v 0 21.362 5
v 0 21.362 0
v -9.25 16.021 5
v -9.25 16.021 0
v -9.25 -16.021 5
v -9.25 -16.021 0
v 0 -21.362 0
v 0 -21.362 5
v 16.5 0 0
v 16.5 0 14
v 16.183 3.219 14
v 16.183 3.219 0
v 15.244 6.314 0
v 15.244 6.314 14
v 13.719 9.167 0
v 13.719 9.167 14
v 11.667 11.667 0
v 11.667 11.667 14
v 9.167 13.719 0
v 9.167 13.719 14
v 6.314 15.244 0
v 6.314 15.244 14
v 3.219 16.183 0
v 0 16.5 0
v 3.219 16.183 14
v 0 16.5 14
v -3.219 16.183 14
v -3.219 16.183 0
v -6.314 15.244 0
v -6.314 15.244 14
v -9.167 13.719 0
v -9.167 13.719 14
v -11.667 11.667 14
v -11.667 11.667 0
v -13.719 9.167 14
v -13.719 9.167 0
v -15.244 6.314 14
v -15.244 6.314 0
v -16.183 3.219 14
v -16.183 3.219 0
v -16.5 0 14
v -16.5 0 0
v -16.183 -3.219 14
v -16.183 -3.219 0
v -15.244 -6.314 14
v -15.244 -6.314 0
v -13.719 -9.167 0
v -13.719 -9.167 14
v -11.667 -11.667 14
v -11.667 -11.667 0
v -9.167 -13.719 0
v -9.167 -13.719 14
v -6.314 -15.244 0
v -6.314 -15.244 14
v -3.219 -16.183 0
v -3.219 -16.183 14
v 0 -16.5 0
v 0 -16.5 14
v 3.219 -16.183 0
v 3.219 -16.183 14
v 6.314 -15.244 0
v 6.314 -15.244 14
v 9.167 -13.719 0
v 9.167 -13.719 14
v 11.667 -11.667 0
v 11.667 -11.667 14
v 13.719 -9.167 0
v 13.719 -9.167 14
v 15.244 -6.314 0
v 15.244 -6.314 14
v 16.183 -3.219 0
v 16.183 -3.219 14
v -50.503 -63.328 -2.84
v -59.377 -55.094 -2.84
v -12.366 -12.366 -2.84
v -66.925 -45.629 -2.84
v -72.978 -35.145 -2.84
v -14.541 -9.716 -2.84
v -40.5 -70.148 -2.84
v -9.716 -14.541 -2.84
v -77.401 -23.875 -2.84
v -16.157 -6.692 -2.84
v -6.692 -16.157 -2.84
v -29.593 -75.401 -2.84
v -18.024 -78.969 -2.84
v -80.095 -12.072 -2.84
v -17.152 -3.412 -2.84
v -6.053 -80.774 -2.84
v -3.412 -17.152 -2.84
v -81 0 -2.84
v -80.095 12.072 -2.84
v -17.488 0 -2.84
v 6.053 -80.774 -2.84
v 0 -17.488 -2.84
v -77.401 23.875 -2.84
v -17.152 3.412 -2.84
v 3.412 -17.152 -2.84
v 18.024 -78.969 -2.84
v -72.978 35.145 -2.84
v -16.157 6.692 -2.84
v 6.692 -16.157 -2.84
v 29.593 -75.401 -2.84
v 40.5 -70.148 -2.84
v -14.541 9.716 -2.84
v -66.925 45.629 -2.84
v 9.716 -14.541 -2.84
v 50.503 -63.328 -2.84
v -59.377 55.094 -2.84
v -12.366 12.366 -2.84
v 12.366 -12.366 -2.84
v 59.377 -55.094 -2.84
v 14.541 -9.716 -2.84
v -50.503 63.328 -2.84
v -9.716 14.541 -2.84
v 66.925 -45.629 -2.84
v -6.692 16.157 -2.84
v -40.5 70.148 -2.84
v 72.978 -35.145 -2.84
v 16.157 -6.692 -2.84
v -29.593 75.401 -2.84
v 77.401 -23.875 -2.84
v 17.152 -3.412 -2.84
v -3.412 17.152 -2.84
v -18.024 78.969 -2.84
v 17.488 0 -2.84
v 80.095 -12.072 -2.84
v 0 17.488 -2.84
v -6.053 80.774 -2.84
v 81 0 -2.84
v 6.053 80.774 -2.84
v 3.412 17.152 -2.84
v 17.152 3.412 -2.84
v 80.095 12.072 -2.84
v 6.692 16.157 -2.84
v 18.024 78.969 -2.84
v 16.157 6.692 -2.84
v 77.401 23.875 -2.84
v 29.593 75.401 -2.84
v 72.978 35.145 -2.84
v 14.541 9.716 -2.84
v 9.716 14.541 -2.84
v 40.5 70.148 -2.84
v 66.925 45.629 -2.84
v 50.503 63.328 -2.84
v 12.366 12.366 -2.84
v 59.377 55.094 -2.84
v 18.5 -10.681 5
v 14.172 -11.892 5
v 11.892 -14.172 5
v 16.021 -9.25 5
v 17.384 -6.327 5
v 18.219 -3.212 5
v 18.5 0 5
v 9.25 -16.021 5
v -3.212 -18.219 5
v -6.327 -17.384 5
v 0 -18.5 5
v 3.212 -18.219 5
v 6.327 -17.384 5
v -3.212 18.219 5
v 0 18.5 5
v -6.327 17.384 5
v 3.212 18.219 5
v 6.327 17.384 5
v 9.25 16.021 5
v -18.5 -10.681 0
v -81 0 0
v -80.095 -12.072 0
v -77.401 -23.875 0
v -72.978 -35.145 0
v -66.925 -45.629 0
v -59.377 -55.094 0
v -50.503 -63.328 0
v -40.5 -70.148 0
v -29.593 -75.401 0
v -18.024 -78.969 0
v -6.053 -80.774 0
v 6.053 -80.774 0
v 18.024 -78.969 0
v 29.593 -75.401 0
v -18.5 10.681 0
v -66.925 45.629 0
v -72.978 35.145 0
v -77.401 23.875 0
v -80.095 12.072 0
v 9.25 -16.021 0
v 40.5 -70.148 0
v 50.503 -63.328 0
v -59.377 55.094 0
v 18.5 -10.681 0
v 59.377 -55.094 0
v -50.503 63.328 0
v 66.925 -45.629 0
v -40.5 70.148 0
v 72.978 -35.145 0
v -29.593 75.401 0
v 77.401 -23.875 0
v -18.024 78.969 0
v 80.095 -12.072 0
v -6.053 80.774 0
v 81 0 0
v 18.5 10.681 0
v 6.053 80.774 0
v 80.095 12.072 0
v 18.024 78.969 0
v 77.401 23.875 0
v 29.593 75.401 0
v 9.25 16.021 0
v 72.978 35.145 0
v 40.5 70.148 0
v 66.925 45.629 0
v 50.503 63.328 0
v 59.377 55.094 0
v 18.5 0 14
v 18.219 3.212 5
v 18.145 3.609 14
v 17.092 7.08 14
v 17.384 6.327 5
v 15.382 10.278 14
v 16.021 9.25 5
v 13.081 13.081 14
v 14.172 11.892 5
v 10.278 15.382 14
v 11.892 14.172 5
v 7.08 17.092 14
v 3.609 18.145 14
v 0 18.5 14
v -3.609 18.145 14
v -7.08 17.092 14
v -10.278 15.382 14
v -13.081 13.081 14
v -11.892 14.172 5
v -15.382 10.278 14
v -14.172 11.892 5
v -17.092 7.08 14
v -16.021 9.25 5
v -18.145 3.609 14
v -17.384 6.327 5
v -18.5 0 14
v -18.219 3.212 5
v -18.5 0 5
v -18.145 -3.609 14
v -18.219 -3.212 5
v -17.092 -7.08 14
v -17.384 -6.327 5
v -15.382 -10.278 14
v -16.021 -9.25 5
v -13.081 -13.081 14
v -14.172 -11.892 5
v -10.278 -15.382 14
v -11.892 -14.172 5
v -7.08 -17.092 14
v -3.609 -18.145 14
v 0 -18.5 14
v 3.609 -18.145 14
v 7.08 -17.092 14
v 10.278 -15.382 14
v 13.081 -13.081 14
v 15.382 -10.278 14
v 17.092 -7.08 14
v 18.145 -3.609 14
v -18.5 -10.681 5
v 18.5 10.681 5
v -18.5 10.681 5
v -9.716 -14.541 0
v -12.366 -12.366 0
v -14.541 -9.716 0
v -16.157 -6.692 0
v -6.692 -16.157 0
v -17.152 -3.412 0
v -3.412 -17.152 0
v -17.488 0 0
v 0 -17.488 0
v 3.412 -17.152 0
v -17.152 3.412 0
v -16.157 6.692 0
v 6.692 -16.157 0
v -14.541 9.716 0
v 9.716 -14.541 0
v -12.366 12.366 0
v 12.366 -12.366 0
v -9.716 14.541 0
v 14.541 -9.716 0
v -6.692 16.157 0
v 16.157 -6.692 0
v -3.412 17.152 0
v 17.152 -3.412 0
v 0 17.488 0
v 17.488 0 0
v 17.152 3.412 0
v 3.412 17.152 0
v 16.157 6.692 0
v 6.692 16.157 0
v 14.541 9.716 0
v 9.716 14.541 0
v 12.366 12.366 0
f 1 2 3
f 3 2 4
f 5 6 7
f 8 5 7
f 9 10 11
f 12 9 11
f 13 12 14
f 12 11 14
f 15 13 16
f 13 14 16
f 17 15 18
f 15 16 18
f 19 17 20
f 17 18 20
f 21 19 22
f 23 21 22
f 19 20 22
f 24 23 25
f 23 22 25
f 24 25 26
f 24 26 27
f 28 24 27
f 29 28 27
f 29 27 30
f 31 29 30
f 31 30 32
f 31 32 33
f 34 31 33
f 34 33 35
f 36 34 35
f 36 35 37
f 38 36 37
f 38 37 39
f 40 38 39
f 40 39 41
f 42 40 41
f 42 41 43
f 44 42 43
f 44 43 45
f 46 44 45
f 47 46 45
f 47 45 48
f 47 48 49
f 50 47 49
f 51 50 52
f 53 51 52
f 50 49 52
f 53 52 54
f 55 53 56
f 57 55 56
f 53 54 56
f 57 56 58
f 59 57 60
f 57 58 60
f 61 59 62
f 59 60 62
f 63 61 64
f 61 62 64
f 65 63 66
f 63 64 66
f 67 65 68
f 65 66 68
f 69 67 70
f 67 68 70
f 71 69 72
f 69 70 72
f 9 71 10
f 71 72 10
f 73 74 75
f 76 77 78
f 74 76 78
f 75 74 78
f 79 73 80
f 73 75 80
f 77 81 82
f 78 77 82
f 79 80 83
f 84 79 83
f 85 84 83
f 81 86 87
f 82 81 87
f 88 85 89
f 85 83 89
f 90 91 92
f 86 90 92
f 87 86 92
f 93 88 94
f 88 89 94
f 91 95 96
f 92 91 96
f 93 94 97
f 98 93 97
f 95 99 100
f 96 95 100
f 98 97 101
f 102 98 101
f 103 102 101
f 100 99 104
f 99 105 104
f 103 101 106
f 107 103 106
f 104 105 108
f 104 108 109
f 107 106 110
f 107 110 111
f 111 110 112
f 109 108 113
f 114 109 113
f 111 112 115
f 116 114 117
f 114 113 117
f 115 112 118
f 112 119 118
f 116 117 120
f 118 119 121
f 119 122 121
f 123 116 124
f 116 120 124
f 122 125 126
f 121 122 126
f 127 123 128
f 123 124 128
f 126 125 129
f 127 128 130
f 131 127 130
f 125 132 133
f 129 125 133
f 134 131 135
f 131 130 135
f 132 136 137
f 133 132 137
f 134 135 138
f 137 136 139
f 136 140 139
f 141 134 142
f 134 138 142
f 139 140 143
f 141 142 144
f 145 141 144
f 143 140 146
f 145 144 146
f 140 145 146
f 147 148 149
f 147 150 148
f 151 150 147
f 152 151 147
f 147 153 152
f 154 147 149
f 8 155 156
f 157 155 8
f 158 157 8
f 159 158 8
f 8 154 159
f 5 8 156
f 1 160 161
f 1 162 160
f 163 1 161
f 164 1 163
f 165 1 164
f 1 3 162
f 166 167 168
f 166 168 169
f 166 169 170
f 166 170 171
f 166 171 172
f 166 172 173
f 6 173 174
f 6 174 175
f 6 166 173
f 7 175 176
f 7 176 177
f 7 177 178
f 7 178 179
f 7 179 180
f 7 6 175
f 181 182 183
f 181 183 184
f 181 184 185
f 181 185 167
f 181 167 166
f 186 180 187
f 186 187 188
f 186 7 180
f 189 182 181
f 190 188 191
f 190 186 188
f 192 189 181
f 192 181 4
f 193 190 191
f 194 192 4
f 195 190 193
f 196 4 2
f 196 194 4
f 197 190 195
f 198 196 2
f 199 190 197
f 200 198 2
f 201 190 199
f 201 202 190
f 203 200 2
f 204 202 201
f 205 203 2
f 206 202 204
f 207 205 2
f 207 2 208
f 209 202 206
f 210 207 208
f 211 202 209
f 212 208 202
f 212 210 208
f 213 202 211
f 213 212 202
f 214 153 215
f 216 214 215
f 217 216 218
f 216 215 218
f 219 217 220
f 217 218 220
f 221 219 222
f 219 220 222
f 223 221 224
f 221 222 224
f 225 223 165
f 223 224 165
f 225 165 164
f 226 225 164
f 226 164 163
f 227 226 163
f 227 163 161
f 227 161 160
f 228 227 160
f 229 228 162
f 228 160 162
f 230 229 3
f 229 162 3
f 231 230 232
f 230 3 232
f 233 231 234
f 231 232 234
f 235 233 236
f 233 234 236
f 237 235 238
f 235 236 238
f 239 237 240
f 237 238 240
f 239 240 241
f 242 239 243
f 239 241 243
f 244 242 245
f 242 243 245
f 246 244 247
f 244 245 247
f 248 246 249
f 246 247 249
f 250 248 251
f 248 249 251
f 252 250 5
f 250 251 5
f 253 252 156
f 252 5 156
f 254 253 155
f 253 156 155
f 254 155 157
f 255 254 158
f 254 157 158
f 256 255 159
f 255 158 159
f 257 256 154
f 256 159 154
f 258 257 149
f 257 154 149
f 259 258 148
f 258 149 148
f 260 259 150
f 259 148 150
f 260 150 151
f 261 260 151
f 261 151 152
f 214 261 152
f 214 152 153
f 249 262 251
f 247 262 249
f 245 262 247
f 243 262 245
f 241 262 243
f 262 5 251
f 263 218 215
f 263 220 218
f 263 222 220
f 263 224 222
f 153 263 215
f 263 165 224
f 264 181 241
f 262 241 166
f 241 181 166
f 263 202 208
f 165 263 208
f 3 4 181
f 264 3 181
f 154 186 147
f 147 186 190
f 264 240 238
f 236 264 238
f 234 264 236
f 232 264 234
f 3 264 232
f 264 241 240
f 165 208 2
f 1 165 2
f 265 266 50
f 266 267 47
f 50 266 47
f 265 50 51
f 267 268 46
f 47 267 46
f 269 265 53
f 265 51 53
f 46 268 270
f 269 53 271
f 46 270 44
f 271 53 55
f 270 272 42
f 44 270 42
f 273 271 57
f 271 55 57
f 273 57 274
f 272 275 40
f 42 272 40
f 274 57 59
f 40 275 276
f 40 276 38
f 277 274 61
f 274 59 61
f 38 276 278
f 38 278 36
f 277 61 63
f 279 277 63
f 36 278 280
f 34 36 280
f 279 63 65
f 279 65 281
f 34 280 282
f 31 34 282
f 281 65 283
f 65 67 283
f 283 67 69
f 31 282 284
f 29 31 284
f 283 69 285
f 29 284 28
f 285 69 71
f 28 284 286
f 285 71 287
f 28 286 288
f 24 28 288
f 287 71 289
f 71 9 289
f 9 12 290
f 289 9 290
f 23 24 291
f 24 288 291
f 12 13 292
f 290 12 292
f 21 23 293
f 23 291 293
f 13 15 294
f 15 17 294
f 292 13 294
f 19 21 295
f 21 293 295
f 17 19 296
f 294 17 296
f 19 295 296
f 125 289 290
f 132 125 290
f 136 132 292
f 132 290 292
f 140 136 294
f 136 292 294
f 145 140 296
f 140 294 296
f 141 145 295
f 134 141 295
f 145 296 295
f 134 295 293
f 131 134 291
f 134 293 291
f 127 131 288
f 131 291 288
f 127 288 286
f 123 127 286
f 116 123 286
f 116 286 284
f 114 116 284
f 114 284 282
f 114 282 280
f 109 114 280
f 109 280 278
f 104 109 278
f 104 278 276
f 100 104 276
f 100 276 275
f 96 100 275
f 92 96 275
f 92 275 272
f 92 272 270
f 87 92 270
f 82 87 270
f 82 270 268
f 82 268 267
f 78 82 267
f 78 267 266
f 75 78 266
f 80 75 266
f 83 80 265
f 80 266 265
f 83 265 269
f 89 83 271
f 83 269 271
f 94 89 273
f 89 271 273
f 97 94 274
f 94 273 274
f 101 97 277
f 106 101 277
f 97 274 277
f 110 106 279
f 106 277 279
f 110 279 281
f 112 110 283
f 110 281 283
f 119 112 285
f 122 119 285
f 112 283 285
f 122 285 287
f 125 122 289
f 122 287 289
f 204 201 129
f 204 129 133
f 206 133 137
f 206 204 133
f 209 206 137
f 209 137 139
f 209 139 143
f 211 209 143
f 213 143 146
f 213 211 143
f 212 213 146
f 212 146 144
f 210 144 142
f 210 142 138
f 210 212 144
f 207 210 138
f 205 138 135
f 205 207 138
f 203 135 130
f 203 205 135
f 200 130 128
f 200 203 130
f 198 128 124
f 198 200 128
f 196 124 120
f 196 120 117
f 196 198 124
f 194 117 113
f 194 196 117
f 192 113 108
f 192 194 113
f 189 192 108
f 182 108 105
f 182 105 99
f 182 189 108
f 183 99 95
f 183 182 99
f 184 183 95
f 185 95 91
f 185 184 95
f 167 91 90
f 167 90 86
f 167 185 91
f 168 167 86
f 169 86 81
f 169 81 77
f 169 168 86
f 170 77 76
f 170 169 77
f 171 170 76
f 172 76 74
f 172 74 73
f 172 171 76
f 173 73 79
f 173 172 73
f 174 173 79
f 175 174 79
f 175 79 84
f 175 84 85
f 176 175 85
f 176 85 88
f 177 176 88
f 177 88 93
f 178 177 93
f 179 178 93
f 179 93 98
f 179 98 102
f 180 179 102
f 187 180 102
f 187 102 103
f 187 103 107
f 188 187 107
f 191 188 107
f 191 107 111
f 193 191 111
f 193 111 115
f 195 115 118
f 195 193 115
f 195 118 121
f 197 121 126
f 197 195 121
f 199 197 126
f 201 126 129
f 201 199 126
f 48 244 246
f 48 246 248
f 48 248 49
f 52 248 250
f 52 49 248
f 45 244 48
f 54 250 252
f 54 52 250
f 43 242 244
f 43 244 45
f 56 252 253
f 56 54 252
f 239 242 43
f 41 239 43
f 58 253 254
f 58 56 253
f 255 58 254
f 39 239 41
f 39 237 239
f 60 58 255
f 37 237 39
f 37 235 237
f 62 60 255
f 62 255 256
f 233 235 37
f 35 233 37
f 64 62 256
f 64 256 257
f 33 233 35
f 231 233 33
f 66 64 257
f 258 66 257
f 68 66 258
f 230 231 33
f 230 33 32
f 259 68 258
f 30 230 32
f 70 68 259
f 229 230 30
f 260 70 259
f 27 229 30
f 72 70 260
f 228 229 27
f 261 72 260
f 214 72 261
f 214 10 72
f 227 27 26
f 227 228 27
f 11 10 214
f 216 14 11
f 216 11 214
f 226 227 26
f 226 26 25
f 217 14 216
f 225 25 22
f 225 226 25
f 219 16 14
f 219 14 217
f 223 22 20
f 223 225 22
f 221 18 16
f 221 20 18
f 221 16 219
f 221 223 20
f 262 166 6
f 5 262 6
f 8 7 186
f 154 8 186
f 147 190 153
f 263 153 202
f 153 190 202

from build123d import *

# Parameters (mm, degrees)
F1_DEPTH = 5
F2_R     = 18.5
F3_DEPTH = 9
F4_R     = 16.5
F5_DEPTH = 25
F6_R     = 81
F7_DEPTH = 2.84
F8_R     = 17.4877623158
F9_DEPTH = 25


with BuildPart() as f1:
    # F0 (on Top) → F1 (new body)
    with BuildSketch(Plane.XY):
        with BuildLine():
            Line((18.5, 0), (18.5, 10.68097998))
            Line((18.5, 10.68097998), (9.2500001737, 16.0214698697))
            ThreePointArc((9.2500001737, 16.0214698697), (16.0214700202, 9.2499999131), (18.5, 0))
        make_face()
        with BuildLine():
            ThreePointArc((9.2500002367, -16.0214698334), (16.0214700383, -9.2499998817), (18.5, 0))
            ThreePointArc((18.5, 0), (16.0214700202, 9.2499999131), (9.2500001737, 16.0214698697))
            ThreePointArc((9.2500001737, 16.0214698697), (3.666e-07, 18.5), (-9.2499995387, 16.0214702364))
            ThreePointArc((-9.2499995387, 16.0214702364), (-16.0214698368, 9.2500002307), (-18.5, 0))
            ThreePointArc((-18.5, 0), (-16.0214699908, -9.2499999641), (-9.2500000719, -16.0214699285))
            ThreePointArc((-9.2500000719, -16.0214699285), (9.51e-08, -18.5), (9.2500002367, -16.0214698334))
        make_face()
        with BuildLine():
            Line((18.5, -10.68097998), (18.5, 0))
            ThreePointArc((18.5, 0), (16.0214700383, -9.2499998817), (9.2500002367, -16.0214698334))
            Line((9.2500002367, -16.0214698334), (18.5, -10.68097998))
        make_face()
        with BuildLine():
            ThreePointArc((-9.2499995387, 16.0214702364), (3.666e-07, 18.5), (9.2500001737, 16.0214698697))
            Line((9.2500001737, 16.0214698697), (0, 21.36195996))
            Line((0, 21.36195996), (-9.2499995387, 16.0214702364))
        make_face()
        with BuildLine():
            Line((0, -21.36195996), (9.2500002367, -16.0214698334))
            ThreePointArc((9.2500002367, -16.0214698334), (9.51e-08, -18.5), (-9.2500000719, -16.0214699285))
            Line((-9.2500000719, -16.0214699285), (0, -21.36195996))
        make_face()
        with BuildLine():
            ThreePointArc((-18.5, 0), (-16.0214698368, 9.2500002307), (-9.2499995387, 16.0214702364))
            Line((-9.2499995387, 16.0214702364), (-18.5, 10.68097998))
            Line((-18.5, 10.68097998), (-18.5, 0))
        make_face()
        with BuildLine():
            Line((-18.5, -10.68097998), (-9.2500000719, -16.0214699285))
            ThreePointArc((-9.2500000719, -16.0214699285), (-16.0214699908, -9.2499999641), (-18.5, 0))
            Line((-18.5, 0), (-18.5, -10.68097998))
        make_face()
    extrude(amount=F1_DEPTH)

    # F2 (on face) → F3 (join)
    with BuildSketch(Plane.XY.offset(5)):
        Circle(F2_R)
    extrude(amount=F3_DEPTH)

    # F4 (on face) → F5 (cut)
    with BuildSketch(Plane.XY.offset(14)):
        Circle(F4_R)
    extrude(amount=-F5_DEPTH, mode=Mode.SUBTRACT)

    # F6 (on Top) → F7 (join)
    with BuildSketch(Plane.XY):
        Circle(F6_R)
    extrude(amount=-F7_DEPTH)

    # F8 (on face) → F9 (cut)
    with BuildSketch(Plane.XY):
        Circle(F8_R)
    extrude(amount=-F9_DEPTH, mode=Mode.SUBTRACT)


solid = f1.part
